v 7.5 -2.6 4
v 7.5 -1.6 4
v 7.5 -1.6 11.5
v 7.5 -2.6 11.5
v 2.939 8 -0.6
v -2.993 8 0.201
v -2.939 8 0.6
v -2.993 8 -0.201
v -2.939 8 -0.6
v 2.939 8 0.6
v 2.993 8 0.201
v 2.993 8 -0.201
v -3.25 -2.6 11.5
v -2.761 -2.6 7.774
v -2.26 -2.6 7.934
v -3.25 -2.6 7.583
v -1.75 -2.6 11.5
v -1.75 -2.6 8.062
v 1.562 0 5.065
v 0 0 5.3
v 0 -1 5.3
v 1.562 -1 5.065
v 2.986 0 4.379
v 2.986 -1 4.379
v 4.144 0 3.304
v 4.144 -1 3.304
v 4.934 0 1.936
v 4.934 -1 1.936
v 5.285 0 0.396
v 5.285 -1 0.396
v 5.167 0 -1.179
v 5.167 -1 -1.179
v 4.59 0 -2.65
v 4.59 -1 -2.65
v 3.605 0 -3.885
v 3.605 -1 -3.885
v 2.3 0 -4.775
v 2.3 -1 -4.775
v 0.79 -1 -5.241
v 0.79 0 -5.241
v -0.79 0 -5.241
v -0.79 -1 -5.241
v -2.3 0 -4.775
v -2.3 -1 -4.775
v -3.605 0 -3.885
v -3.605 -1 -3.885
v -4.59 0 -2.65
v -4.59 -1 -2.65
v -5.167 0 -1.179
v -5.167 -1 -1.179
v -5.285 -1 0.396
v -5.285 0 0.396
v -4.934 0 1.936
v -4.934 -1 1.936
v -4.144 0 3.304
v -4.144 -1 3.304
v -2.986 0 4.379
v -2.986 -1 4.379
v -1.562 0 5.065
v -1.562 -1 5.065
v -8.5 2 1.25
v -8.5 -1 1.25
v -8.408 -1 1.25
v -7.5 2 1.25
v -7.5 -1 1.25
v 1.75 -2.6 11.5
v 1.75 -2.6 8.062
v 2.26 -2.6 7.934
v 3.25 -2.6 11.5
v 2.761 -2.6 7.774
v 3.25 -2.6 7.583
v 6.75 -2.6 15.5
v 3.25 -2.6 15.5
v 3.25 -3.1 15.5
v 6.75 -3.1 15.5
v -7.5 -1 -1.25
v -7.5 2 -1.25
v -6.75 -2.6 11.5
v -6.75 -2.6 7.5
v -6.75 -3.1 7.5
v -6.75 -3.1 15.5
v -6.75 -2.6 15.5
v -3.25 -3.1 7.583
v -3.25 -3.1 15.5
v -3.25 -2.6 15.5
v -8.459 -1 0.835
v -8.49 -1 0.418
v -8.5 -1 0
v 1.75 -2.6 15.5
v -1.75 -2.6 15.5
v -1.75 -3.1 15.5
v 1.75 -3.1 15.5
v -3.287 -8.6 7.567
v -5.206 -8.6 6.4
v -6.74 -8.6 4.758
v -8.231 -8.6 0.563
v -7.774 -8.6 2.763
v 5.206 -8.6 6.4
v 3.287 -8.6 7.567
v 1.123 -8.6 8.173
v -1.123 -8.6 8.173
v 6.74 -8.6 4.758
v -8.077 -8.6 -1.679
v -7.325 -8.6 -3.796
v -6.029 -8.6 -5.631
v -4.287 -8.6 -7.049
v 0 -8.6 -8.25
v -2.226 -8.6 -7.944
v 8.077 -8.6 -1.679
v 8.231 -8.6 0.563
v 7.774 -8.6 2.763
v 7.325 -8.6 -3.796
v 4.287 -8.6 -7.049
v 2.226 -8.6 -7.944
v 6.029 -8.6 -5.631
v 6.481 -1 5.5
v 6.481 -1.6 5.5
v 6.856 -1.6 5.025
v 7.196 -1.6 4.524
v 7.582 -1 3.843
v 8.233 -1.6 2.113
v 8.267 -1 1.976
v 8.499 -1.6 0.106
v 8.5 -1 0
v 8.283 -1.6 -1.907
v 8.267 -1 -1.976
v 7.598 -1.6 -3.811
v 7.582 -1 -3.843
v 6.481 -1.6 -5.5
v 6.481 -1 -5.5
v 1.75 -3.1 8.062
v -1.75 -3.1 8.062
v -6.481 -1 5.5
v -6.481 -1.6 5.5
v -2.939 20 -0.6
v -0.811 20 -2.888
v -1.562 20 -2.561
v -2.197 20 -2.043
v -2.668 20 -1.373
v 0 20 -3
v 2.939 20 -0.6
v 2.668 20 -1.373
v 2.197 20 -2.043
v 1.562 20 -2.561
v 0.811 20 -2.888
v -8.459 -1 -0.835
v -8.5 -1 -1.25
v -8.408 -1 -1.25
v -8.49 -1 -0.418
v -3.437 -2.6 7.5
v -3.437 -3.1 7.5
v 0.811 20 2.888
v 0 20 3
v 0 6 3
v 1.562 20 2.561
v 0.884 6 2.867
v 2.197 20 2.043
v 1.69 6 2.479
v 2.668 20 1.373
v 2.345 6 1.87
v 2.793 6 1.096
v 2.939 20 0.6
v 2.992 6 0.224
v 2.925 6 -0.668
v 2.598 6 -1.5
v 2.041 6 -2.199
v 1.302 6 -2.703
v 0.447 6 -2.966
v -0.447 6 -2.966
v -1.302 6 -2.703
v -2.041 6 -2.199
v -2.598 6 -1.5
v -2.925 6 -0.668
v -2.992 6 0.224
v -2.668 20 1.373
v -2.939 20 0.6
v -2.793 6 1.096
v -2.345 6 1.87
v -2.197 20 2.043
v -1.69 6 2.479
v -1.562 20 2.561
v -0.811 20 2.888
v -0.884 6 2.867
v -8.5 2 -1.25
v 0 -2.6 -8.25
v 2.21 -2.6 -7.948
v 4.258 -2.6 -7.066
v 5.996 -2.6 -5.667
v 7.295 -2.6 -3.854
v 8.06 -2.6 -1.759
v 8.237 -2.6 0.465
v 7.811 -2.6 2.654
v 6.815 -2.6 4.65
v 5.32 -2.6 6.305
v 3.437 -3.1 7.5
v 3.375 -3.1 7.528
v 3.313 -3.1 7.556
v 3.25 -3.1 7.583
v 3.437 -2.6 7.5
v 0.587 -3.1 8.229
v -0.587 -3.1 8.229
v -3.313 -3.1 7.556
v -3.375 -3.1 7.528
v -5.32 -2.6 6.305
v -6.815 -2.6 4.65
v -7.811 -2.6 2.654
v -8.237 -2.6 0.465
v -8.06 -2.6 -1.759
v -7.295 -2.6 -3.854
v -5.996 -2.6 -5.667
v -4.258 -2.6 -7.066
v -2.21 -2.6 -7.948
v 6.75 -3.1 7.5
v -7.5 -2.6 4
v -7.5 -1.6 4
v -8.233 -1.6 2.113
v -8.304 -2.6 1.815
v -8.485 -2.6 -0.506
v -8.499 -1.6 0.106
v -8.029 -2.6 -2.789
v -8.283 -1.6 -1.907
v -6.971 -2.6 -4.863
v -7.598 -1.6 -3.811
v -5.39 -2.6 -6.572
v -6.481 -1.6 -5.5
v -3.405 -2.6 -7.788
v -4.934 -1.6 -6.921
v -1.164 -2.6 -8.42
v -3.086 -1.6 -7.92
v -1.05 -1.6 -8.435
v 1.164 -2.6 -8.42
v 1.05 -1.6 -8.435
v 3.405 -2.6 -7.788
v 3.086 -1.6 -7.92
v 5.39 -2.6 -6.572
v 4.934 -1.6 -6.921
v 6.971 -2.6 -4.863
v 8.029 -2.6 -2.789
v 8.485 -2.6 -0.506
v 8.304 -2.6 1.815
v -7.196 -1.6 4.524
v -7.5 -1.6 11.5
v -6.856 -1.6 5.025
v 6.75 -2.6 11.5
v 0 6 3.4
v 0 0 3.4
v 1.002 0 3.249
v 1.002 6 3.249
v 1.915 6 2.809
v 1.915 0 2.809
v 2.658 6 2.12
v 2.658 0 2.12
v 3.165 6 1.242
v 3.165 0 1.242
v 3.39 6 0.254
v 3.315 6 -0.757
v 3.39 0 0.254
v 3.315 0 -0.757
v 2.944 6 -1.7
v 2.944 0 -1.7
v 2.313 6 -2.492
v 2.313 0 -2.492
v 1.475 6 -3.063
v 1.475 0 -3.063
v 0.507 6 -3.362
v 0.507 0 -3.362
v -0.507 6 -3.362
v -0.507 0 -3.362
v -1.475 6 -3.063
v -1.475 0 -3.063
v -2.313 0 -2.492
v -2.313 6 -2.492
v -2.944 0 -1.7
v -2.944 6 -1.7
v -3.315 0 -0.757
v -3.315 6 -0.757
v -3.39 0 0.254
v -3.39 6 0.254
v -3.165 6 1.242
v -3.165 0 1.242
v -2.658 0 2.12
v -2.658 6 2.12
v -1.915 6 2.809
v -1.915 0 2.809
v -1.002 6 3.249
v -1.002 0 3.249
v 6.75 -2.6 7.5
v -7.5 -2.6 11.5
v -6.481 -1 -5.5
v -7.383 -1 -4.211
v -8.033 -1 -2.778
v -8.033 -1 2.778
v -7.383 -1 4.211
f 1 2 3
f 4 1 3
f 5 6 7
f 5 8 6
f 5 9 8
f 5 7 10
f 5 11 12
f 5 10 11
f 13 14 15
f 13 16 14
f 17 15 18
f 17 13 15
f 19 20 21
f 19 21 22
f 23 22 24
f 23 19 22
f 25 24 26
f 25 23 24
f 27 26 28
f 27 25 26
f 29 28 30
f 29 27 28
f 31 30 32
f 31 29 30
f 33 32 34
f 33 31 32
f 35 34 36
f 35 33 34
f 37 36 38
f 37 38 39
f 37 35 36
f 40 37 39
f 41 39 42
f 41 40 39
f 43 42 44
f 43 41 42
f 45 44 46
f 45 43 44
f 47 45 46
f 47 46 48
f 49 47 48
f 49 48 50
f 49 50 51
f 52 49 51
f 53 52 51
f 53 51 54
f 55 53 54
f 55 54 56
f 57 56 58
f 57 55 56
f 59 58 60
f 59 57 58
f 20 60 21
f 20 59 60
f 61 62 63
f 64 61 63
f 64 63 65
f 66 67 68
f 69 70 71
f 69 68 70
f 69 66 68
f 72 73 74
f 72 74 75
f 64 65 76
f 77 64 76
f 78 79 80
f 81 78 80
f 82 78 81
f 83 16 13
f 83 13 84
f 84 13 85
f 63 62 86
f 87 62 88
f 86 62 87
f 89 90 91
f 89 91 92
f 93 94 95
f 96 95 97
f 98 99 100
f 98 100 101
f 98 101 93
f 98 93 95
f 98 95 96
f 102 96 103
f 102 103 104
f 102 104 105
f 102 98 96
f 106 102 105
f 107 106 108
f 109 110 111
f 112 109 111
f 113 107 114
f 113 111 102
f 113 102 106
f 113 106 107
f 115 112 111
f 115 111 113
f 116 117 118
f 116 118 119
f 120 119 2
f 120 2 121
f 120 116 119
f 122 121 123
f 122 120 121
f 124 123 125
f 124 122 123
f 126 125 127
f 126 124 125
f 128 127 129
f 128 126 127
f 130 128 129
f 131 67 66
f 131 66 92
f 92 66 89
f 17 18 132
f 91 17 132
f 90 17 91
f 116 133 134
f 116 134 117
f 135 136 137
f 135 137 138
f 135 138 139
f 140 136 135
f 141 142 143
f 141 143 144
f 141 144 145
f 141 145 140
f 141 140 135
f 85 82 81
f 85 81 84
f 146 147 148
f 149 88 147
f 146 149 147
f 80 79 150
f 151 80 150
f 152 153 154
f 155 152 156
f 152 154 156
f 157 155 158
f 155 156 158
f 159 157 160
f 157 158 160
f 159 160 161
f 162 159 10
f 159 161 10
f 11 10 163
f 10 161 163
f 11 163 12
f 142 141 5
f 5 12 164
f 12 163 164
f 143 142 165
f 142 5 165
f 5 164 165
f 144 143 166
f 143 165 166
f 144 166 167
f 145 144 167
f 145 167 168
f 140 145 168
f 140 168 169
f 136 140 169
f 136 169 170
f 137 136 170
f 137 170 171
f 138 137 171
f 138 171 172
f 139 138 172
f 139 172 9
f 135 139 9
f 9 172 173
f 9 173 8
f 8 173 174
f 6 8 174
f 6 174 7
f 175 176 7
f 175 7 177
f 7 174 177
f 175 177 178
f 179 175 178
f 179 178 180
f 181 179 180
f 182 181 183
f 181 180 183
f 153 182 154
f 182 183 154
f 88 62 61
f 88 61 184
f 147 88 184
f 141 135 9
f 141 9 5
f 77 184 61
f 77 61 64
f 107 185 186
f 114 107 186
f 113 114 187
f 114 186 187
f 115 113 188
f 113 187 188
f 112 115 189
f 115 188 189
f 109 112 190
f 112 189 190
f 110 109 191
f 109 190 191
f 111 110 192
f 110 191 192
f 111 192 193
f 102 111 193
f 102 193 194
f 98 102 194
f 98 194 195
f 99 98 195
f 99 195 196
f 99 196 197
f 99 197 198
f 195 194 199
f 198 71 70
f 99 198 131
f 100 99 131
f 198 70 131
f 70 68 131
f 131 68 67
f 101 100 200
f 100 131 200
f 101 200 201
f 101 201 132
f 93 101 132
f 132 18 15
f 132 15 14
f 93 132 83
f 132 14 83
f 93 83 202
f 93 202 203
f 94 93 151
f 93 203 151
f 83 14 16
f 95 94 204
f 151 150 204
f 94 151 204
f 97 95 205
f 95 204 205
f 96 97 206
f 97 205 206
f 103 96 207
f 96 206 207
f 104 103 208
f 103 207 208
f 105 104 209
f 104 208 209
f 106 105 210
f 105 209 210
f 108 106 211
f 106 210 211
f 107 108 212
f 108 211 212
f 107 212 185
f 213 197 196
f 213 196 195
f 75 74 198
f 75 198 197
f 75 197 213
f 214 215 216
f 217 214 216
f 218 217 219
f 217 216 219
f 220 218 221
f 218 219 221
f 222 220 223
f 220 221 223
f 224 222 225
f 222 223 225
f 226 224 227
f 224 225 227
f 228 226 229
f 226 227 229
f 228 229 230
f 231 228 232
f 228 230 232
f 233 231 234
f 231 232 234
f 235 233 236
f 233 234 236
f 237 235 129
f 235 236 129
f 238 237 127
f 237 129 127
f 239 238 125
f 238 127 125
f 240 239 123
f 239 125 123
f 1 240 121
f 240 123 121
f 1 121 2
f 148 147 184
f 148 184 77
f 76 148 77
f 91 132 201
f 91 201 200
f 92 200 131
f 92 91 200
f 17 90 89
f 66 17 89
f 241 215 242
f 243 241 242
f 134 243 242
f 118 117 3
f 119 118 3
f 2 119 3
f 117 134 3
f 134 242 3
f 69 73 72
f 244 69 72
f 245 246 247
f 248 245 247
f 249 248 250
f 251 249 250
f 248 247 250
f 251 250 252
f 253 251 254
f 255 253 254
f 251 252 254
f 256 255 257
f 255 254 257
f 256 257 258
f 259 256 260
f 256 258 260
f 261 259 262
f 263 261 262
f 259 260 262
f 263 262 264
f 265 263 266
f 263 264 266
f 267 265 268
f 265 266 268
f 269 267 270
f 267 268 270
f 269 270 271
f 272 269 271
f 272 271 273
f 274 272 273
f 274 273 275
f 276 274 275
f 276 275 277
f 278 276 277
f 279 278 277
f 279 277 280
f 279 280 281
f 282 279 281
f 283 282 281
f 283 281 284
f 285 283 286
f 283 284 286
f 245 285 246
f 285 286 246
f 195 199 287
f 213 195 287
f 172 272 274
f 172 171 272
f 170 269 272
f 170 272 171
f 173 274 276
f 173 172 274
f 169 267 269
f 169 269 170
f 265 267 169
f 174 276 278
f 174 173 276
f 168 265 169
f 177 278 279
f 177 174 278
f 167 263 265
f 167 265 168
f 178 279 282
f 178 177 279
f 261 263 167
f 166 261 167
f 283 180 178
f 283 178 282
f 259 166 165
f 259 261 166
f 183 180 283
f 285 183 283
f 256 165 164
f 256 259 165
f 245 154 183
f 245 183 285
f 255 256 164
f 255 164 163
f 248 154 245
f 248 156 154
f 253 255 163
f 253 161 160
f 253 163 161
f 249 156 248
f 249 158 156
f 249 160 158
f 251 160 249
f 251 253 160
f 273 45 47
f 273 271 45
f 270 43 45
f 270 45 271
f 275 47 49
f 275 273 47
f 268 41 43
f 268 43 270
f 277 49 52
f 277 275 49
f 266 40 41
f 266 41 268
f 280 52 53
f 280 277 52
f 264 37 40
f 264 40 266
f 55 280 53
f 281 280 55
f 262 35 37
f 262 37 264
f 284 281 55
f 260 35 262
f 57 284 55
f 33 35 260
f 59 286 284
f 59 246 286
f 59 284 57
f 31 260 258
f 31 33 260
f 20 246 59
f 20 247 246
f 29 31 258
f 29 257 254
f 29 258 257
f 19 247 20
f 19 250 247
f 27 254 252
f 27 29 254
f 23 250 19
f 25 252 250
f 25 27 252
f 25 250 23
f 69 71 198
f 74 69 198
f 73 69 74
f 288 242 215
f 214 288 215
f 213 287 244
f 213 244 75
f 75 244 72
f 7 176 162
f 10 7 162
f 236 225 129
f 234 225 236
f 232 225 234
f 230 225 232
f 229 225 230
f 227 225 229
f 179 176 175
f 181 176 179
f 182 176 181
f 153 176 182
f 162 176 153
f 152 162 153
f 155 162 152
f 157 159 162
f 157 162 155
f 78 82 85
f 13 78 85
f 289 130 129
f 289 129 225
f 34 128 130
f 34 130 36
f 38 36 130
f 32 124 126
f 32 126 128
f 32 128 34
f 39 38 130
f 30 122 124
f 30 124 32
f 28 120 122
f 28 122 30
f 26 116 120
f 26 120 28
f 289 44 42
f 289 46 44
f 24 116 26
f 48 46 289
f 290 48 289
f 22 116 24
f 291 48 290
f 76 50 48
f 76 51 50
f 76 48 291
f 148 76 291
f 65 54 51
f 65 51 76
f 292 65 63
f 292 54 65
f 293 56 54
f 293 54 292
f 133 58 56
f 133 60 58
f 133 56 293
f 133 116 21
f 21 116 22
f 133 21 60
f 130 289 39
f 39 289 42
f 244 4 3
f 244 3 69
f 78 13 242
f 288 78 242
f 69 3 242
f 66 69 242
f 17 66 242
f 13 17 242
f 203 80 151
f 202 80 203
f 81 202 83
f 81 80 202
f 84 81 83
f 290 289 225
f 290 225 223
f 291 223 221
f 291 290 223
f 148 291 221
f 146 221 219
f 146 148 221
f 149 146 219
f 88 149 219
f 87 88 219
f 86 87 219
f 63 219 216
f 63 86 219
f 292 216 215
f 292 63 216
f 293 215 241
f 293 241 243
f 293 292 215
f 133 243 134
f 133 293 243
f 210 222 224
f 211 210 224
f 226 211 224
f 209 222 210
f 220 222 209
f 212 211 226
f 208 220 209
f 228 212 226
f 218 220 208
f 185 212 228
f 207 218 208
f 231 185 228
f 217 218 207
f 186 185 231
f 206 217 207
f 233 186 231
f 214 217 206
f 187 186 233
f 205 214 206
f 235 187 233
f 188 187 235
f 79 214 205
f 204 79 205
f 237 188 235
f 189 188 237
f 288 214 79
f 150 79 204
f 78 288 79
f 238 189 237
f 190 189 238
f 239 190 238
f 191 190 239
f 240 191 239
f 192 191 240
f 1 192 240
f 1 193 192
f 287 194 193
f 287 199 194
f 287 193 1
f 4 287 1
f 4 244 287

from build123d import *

# Parameters (mm, degrees)
SKETCH1_R           = 5.3
BOSS_EXTRUDE1_DEPTH = 1
SKETCH2_R           = 3.4
BOSS_EXTRUDE2_DEPTH = 6
SKETCH3_R           = 3
BOSS_EXTRUDE3_DEPTH = 14
SKETCH4_W           = 8
SKETCH4_H           = 1.2
CUT_EXTRUDE1_DEPTH  = 12
BOSS_EXTRUDE4_DEPTH = 0.6
BOSS_EXTRUDE5_DEPTH = 1
SKETCH7_R           = 8.25
BOSS_EXTRUDE6_DEPTH = 6
SKETCH8_W           = 3.5
SKETCH8_H           = 8
BOSS_EXTRUDE7_DEPTH = 0.5
SKETCH9_W           = 1
SKETCH9_H           = 2.5
BOSS_EXTRUDE8_DEPTH = 3


with BuildPart() as part:
    # Sketch1 → Boss-Extrude1 (new body)
    with BuildSketch(Plane(origin=(0, 0, 0), x_dir=(1, 0, 0), z_dir=(0, 1, 0))):
        with Locations(Location((0, 0, 0), (0, 0, 270))):
            Circle(SKETCH1_R)
    extrude(amount=-BOSS_EXTRUDE1_DEPTH)

    # Sketch2 → Boss-Extrude2 (add)
    with BuildSketch(Plane(origin=(0, 0, 0), x_dir=(1, 0, 0), z_dir=(0, 1, 0))):
        with Locations(Location((0, 0, 0), (0, 0, 270))):
            Circle(SKETCH2_R)
    extrude(amount=BOSS_EXTRUDE2_DEPTH)

    # Sketch3 → Boss-Extrude3 (add)
    with BuildSketch(Plane(origin=(0, 6, 0), x_dir=(1, 0, 0), z_dir=(0, 1, 0))):
        with Locations(Location((0, 0, 0), (0, 0, 270))):
            Circle(SKETCH3_R)
    extrude(amount=BOSS_EXTRUDE3_DEPTH)

    # Sketch4 → Cut-Extrude1 (cut)
    with BuildSketch(Plane(origin=(0, 20, 0), x_dir=(1, 0, 0), z_dir=(0, 1, 0))):
        Rectangle(SKETCH4_W, SKETCH4_H)
    extrude(amount=-CUT_EXTRUDE1_DEPTH, mode=Mode.SUBTRACT)

    # Sketch5 → Boss-Extrude4 (add)
    with BuildSketch(Plane.XZ.offset(1)):
        with BuildLine():
            Line((-6.480740698, 5.5), (6.480740698, 5.5))
            ThreePointArc((6.480740698, 5.5), (8.5, 0), (6.480740698, -5.5))
            Line((6.480740698, -5.5), (-6.480740698, -5.5))
            ThreePointArc((-6.480740698, -5.5), (-8.5, 0), (-6.480740698, 5.5))
        make_face()
    extrude(amount=BOSS_EXTRUDE4_DEPTH)

    # Sketch6 → Boss-Extrude5 (add)
    with BuildSketch(Plane.XZ.offset(1.6)):
        with BuildLine():
            Line((7.5, 4), (7.5, 11.5))
            Line((7.5, 11.5), (-7.5, 11.5))
            Line((-7.5, 11.5), (-7.5, 4))
            ThreePointArc((-7.5, 4), (0, -8.5), (7.5, 4))
        make_face()
    extrude(amount=BOSS_EXTRUDE5_DEPTH)

    # Sketch7 → Boss-Extrude6 (add)
    with BuildSketch(Plane.XZ.offset(2.6)):
        with Locations(Location((0, 0, 0), (0, 0, 270))):
            Circle(SKETCH7_R)
    extrude(amount=BOSS_EXTRUDE6_DEPTH)

    # Sketch8 → Boss-Extrude7 (add)
    with BuildSketch(Plane.XZ.offset(2.6)):
        with Locations((-5, 11.5)):
            Rectangle(SKETCH8_W, SKETCH8_H)
        with Locations((0, 11.5)):
            Rectangle(SKETCH8_W, SKETCH8_H)
        with Locations((5, 11.5)):
            Rectangle(SKETCH8_W, SKETCH8_H)
    extrude(amount=BOSS_EXTRUDE7_DEPTH)

    # Sketch9 → Boss-Extrude8 (add)
    with BuildSketch(Plane(origin=(0, -1, 0), x_dir=(1, 0, 0), z_dir=(0, 1, 0))):
        with Locations((-8, 0)):
            Rectangle(SKETCH9_W, SKETCH9_H)
    extrude(amount=BOSS_EXTRUDE8_DEPTH)


solid = part.part
